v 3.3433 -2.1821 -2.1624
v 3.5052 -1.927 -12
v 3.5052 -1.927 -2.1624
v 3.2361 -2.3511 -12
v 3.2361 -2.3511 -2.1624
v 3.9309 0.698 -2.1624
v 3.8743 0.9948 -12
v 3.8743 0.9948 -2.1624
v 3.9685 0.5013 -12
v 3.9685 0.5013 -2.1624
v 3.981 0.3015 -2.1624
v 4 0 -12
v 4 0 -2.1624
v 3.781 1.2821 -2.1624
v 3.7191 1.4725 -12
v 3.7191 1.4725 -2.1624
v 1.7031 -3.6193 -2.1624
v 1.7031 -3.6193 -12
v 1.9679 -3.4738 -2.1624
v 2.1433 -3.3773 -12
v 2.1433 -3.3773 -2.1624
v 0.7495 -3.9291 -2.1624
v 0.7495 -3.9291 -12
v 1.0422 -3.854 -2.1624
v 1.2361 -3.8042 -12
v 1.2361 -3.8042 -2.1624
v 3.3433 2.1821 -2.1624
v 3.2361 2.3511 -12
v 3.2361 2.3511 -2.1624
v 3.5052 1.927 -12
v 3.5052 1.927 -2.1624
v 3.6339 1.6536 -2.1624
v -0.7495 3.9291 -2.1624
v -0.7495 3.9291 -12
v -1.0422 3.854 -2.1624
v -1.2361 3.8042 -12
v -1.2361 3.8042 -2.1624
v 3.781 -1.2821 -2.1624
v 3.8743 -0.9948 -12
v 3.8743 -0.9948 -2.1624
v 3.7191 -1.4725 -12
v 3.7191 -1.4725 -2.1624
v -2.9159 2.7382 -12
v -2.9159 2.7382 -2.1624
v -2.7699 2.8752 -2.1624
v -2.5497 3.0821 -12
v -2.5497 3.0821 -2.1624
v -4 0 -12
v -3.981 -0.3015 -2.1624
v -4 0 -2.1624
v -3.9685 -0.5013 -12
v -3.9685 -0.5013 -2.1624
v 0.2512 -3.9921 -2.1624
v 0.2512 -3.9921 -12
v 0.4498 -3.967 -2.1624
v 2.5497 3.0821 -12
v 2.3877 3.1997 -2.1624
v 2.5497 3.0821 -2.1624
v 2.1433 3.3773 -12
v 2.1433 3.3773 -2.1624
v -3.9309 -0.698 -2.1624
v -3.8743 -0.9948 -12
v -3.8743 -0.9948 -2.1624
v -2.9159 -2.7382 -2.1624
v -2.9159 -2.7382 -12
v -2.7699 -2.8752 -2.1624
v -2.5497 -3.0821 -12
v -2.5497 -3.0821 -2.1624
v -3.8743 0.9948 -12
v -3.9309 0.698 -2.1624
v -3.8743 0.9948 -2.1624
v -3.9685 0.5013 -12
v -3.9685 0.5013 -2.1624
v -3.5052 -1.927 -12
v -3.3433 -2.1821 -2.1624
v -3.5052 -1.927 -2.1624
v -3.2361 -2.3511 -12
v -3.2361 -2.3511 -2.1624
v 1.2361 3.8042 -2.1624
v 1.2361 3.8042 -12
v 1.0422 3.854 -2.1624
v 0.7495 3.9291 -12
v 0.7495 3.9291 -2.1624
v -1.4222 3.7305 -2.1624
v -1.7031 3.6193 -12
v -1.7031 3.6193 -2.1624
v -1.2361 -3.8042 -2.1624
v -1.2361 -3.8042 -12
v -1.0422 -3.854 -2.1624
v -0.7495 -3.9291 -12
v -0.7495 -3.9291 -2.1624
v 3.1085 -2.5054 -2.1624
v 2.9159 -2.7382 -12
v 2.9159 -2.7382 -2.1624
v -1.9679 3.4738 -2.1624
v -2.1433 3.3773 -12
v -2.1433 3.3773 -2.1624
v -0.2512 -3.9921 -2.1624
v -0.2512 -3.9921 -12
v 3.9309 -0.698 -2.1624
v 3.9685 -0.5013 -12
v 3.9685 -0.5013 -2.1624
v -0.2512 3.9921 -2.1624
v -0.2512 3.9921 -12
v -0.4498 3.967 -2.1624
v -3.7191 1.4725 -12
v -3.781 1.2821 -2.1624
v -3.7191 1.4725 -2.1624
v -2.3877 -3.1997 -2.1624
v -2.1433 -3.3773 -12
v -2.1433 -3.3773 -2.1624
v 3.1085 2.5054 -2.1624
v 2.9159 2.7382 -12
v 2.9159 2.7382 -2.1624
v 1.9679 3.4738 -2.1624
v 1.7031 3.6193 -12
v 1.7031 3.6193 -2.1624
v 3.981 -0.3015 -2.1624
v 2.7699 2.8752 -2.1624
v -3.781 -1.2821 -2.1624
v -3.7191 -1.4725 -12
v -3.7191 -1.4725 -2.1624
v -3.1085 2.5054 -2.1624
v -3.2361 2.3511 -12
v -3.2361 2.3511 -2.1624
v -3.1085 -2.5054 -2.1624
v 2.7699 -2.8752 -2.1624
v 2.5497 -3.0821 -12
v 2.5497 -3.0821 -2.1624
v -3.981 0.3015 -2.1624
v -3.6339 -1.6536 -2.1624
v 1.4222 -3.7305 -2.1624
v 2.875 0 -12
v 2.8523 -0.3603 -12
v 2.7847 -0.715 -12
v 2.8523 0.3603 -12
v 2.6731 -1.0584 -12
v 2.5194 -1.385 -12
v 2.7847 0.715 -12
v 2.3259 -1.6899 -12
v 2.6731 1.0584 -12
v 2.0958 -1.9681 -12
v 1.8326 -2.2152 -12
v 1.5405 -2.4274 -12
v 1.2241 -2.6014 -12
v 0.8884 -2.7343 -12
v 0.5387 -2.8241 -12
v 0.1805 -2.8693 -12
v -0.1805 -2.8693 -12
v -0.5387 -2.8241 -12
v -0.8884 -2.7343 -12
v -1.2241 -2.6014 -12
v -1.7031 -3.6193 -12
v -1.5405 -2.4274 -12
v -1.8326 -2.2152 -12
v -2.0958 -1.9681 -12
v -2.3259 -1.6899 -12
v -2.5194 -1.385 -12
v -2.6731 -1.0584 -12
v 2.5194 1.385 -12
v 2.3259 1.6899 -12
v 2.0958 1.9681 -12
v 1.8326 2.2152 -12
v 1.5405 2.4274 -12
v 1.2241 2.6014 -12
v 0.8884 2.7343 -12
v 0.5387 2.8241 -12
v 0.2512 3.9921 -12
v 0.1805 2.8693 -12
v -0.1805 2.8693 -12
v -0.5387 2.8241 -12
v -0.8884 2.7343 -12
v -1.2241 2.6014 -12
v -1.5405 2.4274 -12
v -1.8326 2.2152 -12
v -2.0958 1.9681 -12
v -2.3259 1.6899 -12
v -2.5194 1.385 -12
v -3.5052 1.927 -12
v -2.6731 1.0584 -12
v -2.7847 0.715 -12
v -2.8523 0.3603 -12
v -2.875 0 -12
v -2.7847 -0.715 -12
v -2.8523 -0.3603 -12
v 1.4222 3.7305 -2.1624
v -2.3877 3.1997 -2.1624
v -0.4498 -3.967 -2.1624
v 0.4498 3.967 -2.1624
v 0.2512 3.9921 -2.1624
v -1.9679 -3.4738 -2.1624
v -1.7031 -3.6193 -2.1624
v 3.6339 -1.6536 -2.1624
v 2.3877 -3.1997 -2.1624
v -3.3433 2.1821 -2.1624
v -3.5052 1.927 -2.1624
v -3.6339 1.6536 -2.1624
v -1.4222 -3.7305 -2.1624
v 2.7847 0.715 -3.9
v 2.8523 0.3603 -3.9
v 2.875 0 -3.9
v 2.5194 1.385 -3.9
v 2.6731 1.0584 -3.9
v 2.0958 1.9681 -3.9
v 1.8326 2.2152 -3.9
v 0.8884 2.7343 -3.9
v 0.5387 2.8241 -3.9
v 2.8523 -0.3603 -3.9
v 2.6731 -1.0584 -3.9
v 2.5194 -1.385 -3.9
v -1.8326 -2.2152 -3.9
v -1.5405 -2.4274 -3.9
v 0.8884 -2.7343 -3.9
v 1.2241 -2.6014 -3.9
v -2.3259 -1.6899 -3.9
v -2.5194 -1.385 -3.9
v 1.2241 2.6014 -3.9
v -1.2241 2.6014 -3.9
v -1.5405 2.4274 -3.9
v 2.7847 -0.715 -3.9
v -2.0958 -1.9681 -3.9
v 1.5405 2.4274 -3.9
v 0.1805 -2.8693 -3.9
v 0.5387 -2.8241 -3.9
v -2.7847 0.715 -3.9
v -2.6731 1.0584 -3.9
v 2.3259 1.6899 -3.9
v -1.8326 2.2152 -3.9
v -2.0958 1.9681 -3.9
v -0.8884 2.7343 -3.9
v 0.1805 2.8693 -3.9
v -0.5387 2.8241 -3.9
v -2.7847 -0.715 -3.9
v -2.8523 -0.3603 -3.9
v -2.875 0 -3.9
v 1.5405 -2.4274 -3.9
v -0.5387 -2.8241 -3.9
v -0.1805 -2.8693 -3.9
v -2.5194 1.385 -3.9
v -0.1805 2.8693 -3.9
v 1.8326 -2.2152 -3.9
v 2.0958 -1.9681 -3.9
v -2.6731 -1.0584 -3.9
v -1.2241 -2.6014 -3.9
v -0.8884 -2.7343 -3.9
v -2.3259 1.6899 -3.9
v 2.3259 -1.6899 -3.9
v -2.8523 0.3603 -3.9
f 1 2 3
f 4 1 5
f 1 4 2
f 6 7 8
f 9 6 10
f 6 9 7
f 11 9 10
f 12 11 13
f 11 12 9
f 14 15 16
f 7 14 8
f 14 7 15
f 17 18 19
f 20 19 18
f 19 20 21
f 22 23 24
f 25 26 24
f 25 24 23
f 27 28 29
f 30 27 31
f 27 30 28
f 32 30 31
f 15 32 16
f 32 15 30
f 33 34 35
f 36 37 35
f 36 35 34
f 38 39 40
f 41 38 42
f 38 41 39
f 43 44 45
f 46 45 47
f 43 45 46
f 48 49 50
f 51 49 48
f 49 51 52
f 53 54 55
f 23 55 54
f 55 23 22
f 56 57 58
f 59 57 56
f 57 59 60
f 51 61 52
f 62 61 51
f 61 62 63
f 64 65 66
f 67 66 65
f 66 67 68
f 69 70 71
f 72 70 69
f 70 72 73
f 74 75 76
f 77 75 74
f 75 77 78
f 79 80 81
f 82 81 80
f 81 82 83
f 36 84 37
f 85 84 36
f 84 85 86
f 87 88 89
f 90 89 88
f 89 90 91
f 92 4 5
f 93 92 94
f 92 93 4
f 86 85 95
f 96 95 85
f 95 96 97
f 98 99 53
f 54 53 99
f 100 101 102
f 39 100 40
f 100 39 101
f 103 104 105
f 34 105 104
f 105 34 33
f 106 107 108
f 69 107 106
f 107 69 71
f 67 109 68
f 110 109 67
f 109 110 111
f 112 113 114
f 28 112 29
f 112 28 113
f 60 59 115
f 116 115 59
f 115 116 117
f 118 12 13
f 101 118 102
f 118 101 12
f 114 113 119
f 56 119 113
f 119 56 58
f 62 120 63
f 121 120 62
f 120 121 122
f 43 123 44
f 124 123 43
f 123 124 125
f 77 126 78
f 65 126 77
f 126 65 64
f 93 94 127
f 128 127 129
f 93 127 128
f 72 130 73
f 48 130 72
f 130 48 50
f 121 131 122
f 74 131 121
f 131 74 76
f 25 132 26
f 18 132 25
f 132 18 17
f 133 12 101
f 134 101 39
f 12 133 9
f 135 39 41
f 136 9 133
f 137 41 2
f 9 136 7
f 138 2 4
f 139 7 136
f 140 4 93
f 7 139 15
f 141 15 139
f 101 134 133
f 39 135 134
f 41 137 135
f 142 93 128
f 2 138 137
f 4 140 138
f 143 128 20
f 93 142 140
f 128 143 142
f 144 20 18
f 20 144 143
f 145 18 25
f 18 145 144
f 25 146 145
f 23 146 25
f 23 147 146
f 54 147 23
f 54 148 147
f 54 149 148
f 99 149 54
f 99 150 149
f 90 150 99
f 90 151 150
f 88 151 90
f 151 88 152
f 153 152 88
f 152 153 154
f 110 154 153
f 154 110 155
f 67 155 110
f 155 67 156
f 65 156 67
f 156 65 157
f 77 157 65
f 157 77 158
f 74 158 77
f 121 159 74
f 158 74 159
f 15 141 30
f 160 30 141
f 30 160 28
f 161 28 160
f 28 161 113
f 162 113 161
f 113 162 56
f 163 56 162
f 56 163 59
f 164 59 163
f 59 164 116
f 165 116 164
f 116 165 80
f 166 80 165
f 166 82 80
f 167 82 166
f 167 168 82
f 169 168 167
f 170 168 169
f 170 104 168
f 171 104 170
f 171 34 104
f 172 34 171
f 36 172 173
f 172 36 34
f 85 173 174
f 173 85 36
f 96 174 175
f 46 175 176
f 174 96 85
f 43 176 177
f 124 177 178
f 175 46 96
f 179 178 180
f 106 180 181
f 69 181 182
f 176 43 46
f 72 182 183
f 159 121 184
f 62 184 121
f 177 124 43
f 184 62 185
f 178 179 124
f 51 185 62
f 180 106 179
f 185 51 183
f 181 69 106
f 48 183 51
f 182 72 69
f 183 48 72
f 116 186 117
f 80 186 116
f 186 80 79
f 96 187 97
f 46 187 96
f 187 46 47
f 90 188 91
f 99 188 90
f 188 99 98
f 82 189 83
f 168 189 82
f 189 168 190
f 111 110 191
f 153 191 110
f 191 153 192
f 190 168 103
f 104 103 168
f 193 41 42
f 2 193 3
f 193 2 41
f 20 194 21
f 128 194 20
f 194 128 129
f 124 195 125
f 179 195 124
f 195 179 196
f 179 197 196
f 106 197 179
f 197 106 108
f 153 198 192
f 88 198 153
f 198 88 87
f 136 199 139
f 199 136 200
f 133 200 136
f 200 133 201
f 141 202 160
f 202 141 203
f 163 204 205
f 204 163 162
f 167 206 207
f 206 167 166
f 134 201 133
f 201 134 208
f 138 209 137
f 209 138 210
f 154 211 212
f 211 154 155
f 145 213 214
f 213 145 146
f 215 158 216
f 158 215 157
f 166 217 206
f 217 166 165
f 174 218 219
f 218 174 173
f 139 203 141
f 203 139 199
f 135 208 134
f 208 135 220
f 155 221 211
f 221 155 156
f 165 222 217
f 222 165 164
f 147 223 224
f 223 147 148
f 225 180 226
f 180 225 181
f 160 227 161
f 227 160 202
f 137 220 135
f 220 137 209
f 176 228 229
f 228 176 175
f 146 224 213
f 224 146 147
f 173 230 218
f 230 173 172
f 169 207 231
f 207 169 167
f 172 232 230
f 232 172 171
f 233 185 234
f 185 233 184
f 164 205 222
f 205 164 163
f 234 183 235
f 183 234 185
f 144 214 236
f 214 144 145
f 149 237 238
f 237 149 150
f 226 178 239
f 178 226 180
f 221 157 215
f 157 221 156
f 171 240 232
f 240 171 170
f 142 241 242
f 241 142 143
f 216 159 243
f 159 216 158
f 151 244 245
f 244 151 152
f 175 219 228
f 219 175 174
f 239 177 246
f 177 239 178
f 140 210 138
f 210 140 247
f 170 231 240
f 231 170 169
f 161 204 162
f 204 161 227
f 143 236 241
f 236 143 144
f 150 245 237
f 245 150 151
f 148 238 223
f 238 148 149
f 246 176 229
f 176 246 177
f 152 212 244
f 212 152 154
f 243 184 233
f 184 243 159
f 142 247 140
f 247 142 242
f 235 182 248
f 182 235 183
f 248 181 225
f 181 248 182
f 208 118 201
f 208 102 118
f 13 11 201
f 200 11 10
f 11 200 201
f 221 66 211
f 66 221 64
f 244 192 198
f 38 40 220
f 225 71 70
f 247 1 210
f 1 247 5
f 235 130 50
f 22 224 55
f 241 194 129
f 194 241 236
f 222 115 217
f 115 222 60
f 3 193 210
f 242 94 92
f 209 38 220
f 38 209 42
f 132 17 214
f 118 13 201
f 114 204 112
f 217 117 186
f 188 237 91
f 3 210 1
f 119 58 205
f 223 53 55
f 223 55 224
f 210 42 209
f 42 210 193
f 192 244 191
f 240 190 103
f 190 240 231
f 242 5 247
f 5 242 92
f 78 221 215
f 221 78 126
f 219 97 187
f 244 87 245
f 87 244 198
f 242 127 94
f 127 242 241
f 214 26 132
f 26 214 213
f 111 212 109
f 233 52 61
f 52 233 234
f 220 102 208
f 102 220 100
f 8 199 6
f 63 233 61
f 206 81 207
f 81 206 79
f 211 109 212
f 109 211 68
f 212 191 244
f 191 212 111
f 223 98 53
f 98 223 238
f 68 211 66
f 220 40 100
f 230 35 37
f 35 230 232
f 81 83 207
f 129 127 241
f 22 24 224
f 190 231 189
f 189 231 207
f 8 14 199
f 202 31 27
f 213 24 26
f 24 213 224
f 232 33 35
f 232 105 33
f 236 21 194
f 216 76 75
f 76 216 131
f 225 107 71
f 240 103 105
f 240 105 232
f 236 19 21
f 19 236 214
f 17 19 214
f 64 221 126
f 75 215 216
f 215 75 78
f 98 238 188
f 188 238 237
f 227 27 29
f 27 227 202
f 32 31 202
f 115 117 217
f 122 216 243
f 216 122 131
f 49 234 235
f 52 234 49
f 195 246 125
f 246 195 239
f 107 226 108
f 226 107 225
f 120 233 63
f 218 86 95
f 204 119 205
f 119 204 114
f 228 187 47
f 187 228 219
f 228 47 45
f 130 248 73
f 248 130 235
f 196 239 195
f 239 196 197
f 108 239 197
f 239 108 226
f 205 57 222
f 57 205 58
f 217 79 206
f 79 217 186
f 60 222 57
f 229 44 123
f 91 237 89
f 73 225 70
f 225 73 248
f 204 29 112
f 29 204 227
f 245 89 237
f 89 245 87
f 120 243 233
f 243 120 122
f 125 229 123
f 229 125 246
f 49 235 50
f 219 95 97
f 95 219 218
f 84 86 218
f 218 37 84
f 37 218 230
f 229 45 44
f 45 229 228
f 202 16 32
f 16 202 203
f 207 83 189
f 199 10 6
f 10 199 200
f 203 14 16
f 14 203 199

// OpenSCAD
$fn = 50;

difference() {
	union() {
		translate(v = [0, 0, -12.0]) {
			cylinder(h = 12, r = 4.0);
		}
		#translate(v = [0, 0, -15.0]) {
			cylinder(h = 15, r = 2.875);
		}
	}
	union() {
		translate(v = [0, 0, 0]) {
			rotate(a = [0, 0, 0]) {
				difference() {
					union() {
						translate(v = [0, 0, -15.0]) {
							cylinder(h = 15, r = 2.6);
						}
						translate(v = [0, 0, -3.9]) {
							cylinder(h = 3.9, r1 = 2.875, r2 = 5.4);
						}
						translate(v = [0, 0, -15.0]) {
							cylinder(h = 15, r = 2.875);
						}
						translate(v = [0, 0, -15.0]) {
							cylinder(h = 15, r = 2.6);
						}
					}
					union();
				}
			}
		}
	}
}
